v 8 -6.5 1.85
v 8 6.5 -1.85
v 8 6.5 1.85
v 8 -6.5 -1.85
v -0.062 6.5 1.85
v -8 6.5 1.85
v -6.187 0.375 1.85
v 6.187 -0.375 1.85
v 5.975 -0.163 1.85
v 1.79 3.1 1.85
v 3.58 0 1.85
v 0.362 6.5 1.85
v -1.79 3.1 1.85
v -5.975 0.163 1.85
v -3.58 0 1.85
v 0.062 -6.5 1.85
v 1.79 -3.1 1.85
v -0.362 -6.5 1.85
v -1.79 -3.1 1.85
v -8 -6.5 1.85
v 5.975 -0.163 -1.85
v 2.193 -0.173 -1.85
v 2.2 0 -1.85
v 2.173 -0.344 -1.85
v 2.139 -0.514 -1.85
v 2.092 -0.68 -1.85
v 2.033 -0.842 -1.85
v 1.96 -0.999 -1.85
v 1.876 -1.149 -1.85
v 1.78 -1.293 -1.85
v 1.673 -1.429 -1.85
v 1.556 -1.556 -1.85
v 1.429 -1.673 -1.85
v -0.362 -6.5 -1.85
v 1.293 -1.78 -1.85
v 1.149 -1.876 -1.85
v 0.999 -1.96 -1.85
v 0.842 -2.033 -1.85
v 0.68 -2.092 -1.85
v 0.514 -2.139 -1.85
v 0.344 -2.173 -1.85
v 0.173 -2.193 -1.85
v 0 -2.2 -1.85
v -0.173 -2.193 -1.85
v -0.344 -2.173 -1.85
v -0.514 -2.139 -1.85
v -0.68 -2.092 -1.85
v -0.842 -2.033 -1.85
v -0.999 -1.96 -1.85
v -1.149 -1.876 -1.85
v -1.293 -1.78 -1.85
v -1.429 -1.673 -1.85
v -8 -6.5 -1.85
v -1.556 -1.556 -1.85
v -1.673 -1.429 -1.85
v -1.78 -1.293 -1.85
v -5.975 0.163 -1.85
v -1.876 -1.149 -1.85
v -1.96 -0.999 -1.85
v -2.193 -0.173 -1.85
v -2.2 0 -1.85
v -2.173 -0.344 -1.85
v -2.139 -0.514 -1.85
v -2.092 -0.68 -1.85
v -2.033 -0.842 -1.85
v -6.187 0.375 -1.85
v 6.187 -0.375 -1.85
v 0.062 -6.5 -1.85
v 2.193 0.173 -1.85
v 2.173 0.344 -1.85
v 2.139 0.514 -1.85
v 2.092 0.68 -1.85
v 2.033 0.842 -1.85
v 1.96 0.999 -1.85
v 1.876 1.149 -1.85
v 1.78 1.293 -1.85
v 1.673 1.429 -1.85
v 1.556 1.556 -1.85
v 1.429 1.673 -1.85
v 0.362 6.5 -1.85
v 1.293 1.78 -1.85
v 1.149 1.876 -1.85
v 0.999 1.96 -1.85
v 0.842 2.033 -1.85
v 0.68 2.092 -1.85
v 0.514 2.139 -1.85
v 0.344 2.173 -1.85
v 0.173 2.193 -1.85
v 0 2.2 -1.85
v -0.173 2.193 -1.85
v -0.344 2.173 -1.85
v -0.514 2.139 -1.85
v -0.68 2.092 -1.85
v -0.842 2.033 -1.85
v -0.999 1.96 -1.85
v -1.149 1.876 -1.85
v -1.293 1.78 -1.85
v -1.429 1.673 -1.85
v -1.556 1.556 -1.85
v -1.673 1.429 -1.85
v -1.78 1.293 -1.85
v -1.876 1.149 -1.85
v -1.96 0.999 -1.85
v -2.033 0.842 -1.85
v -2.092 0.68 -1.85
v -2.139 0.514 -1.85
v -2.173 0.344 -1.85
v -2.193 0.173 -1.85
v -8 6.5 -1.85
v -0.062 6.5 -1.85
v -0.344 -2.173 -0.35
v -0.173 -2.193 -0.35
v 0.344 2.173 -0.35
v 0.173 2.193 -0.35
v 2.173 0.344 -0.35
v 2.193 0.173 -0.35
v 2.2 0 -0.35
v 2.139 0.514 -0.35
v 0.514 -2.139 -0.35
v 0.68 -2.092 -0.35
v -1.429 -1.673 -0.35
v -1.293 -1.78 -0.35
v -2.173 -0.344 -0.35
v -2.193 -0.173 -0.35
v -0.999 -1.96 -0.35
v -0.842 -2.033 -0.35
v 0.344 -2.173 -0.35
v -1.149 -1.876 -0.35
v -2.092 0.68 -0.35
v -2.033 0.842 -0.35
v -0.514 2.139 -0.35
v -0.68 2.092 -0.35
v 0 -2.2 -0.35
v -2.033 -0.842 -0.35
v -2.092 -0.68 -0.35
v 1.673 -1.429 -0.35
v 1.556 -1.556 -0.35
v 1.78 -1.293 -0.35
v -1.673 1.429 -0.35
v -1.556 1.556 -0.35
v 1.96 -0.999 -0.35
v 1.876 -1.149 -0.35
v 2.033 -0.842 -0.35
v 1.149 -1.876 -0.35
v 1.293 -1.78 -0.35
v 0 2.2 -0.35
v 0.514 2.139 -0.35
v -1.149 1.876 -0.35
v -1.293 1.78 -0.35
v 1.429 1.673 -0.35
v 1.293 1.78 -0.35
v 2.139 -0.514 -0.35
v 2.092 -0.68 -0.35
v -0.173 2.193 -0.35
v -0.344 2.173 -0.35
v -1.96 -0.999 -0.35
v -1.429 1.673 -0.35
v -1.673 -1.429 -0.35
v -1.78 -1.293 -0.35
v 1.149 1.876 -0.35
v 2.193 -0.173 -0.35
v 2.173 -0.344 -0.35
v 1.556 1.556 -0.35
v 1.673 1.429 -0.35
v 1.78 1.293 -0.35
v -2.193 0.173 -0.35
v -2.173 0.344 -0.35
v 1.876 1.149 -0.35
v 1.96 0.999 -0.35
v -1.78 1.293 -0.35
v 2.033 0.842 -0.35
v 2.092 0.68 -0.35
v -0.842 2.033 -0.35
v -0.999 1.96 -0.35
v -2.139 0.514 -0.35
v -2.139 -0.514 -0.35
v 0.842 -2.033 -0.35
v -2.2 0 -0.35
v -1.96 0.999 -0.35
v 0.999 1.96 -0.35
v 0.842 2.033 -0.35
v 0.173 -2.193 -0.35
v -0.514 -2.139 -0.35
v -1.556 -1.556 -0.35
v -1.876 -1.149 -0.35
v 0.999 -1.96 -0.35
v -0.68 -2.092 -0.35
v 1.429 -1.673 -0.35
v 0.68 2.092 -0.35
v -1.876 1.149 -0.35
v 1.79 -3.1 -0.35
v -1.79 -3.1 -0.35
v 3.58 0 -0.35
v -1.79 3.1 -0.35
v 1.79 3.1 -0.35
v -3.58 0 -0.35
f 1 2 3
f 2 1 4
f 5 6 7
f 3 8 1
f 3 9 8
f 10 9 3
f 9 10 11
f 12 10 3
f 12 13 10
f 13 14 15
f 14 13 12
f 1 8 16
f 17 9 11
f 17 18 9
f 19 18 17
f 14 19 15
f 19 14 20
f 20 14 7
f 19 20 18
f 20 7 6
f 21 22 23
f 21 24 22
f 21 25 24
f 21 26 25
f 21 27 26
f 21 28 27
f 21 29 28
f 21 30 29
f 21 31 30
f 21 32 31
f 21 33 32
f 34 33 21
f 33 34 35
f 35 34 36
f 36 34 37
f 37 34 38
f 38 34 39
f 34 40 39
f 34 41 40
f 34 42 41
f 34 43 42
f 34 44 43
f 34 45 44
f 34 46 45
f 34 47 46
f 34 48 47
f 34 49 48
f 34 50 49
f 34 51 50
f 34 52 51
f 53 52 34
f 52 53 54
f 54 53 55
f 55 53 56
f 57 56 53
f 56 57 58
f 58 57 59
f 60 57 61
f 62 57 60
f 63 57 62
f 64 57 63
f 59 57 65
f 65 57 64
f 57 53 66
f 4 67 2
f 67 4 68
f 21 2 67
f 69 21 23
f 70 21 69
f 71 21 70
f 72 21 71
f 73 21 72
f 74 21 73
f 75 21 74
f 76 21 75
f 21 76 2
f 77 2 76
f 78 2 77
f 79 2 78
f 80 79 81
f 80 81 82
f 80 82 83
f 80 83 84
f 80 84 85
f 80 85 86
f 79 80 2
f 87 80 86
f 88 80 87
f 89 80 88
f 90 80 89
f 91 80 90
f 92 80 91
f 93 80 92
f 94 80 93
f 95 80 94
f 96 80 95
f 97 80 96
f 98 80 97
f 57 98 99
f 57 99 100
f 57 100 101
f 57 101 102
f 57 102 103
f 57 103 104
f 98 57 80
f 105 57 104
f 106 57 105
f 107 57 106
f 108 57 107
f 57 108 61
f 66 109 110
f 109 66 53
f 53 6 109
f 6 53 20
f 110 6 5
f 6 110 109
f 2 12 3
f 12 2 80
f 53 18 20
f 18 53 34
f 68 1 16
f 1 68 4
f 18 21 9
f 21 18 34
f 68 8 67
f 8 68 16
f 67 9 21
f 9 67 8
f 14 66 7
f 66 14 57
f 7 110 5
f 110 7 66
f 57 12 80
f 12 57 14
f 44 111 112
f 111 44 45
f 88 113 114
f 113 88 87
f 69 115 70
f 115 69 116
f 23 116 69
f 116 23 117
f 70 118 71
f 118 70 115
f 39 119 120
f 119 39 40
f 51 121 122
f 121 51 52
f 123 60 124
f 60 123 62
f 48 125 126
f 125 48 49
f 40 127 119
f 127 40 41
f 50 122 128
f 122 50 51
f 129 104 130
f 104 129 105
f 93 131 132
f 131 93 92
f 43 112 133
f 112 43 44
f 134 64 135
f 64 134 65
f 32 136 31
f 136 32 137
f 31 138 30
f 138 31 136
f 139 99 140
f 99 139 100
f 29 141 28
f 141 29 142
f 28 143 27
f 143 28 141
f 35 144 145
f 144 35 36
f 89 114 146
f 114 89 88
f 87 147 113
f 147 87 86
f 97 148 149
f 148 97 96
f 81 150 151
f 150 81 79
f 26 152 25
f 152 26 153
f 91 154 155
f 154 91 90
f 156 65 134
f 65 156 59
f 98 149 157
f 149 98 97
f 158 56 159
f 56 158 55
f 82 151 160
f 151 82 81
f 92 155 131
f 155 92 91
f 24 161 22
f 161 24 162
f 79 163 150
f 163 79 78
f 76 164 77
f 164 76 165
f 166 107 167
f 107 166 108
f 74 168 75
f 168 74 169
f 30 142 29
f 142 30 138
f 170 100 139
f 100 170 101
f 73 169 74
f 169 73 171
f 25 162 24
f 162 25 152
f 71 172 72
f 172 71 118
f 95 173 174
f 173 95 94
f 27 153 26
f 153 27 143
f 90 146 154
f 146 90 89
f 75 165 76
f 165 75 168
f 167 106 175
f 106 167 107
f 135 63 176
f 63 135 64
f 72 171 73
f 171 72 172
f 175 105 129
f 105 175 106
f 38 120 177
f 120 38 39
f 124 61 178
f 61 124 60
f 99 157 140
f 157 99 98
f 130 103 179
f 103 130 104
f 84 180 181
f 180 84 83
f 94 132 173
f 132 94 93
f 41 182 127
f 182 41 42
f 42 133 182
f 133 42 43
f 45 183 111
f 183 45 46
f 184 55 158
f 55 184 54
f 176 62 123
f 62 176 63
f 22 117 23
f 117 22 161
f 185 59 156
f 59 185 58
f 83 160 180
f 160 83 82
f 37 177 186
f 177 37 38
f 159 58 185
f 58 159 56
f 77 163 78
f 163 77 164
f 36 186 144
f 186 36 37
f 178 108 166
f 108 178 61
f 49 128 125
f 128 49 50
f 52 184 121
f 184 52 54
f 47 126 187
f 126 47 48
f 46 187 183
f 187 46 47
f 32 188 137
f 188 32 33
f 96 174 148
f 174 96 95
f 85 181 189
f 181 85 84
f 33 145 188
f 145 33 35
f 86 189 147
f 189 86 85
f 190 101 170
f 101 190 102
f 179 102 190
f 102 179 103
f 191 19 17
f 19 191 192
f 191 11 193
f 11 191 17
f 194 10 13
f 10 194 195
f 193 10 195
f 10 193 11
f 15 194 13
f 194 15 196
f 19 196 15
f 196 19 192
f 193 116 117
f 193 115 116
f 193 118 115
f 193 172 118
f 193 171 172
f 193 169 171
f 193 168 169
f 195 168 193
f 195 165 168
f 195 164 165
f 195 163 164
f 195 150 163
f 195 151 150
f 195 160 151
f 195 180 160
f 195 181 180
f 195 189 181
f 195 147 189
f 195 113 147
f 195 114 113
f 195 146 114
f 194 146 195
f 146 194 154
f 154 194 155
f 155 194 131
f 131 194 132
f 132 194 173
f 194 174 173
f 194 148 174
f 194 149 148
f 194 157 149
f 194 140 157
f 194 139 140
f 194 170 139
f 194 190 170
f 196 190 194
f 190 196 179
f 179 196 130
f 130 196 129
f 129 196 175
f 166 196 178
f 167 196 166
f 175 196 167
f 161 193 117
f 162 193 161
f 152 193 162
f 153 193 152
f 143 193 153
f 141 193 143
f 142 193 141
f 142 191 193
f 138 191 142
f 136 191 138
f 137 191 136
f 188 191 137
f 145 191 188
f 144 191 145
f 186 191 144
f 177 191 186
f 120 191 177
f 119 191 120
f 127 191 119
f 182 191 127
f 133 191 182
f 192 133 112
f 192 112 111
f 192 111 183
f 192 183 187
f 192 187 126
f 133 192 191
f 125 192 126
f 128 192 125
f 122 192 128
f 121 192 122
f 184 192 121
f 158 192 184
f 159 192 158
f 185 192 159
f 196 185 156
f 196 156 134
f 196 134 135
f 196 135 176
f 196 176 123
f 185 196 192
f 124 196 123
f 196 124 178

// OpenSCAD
$fn = 80;

// Target: T-slot nut for 5.0mm screws, 6.0mm across flats, 3.7mm thick
screw_nominal_diameter_mm = 5.0;
internal_drive_across_flats_mm = 6.0;
thickness_mm = 3.7;

// Fit/print params
tolerance_mm = 0.2;
threaded = 1; // 1=tap drill (for threading), 0=clearance
clearance_hole_diameter_mm = 5.5;
tap_drill_diameter_mm = 4.2;

// Body params (typical small T-nut proportions; adjust if needed)
body_length_mm = 16;
t_major_width_mm = 13;   // wide part that captures under slot lips
t_minor_width_mm = 8;    // neck width that passes through slot opening

// Optional small edge break
edge_chamfer_mm = 0.3;

// Internal hex drive depth (recess)
drive_depth_mm = 2.2;

// Robust boolean overlap
overlap_mm = 0.6;

// ---------- helpers ----------
function hex_circumradius_from_af(af) = af / (2 * cos(30)); // across flats -> circumradius

module hex_prism(af, h, center=false) {
    // true hex (not a circle approximation)
    cylinder(h=h, r=hex_circumradius_from_af(af), $fn=6, center=center);
}

module tslot_nut() {
    hole_d = (threaded > 0.5) ? tap_drill_diameter_mm : clearance_hole_diameter_mm;
    hex_af = internal_drive_across_flats_mm + tolerance_mm;

    difference() {
        // ONE connected solid: a simple T-profile prism (major + minor) fused
        union() {
            // Major (under-lip) block
            cube([body_length_mm, t_major_width_mm, thickness_mm], center=true);

            // Minor (neck) block - centered, same thickness, narrower
            cube([body_length_mm, t_minor_width_mm, thickness_mm], center=true);
        }

        // Through hole for M5 (tap drill or clearance)
        cylinder(h=thickness_mm + 2*overlap_mm, d=hole_d + tolerance_mm, center=true);

        // Internal hex drive recess from top face
        translate([0, 0, thickness_mm/2 - drive_depth_mm])
            hex_prism(hex_af, drive_depth_mm + overlap_mm, center=false);

        // Small edge chamfers on the long edges (optional, subtle)
        // Cut 45° wedges along the two long sides of the major width
        for (sy = [-1, 1]) {
            translate([0,
                       sy*(t_major_width_mm/2 - edge_chamfer_mm/2),
                       0])
                rotate([0, 0, 45])
                    cube([body_length_mm + 2*overlap_mm,
                          edge_chamfer_mm,
                          thickness_mm + 2*overlap_mm],
                         center=true);
        }
    }
}

tslot_nut();
